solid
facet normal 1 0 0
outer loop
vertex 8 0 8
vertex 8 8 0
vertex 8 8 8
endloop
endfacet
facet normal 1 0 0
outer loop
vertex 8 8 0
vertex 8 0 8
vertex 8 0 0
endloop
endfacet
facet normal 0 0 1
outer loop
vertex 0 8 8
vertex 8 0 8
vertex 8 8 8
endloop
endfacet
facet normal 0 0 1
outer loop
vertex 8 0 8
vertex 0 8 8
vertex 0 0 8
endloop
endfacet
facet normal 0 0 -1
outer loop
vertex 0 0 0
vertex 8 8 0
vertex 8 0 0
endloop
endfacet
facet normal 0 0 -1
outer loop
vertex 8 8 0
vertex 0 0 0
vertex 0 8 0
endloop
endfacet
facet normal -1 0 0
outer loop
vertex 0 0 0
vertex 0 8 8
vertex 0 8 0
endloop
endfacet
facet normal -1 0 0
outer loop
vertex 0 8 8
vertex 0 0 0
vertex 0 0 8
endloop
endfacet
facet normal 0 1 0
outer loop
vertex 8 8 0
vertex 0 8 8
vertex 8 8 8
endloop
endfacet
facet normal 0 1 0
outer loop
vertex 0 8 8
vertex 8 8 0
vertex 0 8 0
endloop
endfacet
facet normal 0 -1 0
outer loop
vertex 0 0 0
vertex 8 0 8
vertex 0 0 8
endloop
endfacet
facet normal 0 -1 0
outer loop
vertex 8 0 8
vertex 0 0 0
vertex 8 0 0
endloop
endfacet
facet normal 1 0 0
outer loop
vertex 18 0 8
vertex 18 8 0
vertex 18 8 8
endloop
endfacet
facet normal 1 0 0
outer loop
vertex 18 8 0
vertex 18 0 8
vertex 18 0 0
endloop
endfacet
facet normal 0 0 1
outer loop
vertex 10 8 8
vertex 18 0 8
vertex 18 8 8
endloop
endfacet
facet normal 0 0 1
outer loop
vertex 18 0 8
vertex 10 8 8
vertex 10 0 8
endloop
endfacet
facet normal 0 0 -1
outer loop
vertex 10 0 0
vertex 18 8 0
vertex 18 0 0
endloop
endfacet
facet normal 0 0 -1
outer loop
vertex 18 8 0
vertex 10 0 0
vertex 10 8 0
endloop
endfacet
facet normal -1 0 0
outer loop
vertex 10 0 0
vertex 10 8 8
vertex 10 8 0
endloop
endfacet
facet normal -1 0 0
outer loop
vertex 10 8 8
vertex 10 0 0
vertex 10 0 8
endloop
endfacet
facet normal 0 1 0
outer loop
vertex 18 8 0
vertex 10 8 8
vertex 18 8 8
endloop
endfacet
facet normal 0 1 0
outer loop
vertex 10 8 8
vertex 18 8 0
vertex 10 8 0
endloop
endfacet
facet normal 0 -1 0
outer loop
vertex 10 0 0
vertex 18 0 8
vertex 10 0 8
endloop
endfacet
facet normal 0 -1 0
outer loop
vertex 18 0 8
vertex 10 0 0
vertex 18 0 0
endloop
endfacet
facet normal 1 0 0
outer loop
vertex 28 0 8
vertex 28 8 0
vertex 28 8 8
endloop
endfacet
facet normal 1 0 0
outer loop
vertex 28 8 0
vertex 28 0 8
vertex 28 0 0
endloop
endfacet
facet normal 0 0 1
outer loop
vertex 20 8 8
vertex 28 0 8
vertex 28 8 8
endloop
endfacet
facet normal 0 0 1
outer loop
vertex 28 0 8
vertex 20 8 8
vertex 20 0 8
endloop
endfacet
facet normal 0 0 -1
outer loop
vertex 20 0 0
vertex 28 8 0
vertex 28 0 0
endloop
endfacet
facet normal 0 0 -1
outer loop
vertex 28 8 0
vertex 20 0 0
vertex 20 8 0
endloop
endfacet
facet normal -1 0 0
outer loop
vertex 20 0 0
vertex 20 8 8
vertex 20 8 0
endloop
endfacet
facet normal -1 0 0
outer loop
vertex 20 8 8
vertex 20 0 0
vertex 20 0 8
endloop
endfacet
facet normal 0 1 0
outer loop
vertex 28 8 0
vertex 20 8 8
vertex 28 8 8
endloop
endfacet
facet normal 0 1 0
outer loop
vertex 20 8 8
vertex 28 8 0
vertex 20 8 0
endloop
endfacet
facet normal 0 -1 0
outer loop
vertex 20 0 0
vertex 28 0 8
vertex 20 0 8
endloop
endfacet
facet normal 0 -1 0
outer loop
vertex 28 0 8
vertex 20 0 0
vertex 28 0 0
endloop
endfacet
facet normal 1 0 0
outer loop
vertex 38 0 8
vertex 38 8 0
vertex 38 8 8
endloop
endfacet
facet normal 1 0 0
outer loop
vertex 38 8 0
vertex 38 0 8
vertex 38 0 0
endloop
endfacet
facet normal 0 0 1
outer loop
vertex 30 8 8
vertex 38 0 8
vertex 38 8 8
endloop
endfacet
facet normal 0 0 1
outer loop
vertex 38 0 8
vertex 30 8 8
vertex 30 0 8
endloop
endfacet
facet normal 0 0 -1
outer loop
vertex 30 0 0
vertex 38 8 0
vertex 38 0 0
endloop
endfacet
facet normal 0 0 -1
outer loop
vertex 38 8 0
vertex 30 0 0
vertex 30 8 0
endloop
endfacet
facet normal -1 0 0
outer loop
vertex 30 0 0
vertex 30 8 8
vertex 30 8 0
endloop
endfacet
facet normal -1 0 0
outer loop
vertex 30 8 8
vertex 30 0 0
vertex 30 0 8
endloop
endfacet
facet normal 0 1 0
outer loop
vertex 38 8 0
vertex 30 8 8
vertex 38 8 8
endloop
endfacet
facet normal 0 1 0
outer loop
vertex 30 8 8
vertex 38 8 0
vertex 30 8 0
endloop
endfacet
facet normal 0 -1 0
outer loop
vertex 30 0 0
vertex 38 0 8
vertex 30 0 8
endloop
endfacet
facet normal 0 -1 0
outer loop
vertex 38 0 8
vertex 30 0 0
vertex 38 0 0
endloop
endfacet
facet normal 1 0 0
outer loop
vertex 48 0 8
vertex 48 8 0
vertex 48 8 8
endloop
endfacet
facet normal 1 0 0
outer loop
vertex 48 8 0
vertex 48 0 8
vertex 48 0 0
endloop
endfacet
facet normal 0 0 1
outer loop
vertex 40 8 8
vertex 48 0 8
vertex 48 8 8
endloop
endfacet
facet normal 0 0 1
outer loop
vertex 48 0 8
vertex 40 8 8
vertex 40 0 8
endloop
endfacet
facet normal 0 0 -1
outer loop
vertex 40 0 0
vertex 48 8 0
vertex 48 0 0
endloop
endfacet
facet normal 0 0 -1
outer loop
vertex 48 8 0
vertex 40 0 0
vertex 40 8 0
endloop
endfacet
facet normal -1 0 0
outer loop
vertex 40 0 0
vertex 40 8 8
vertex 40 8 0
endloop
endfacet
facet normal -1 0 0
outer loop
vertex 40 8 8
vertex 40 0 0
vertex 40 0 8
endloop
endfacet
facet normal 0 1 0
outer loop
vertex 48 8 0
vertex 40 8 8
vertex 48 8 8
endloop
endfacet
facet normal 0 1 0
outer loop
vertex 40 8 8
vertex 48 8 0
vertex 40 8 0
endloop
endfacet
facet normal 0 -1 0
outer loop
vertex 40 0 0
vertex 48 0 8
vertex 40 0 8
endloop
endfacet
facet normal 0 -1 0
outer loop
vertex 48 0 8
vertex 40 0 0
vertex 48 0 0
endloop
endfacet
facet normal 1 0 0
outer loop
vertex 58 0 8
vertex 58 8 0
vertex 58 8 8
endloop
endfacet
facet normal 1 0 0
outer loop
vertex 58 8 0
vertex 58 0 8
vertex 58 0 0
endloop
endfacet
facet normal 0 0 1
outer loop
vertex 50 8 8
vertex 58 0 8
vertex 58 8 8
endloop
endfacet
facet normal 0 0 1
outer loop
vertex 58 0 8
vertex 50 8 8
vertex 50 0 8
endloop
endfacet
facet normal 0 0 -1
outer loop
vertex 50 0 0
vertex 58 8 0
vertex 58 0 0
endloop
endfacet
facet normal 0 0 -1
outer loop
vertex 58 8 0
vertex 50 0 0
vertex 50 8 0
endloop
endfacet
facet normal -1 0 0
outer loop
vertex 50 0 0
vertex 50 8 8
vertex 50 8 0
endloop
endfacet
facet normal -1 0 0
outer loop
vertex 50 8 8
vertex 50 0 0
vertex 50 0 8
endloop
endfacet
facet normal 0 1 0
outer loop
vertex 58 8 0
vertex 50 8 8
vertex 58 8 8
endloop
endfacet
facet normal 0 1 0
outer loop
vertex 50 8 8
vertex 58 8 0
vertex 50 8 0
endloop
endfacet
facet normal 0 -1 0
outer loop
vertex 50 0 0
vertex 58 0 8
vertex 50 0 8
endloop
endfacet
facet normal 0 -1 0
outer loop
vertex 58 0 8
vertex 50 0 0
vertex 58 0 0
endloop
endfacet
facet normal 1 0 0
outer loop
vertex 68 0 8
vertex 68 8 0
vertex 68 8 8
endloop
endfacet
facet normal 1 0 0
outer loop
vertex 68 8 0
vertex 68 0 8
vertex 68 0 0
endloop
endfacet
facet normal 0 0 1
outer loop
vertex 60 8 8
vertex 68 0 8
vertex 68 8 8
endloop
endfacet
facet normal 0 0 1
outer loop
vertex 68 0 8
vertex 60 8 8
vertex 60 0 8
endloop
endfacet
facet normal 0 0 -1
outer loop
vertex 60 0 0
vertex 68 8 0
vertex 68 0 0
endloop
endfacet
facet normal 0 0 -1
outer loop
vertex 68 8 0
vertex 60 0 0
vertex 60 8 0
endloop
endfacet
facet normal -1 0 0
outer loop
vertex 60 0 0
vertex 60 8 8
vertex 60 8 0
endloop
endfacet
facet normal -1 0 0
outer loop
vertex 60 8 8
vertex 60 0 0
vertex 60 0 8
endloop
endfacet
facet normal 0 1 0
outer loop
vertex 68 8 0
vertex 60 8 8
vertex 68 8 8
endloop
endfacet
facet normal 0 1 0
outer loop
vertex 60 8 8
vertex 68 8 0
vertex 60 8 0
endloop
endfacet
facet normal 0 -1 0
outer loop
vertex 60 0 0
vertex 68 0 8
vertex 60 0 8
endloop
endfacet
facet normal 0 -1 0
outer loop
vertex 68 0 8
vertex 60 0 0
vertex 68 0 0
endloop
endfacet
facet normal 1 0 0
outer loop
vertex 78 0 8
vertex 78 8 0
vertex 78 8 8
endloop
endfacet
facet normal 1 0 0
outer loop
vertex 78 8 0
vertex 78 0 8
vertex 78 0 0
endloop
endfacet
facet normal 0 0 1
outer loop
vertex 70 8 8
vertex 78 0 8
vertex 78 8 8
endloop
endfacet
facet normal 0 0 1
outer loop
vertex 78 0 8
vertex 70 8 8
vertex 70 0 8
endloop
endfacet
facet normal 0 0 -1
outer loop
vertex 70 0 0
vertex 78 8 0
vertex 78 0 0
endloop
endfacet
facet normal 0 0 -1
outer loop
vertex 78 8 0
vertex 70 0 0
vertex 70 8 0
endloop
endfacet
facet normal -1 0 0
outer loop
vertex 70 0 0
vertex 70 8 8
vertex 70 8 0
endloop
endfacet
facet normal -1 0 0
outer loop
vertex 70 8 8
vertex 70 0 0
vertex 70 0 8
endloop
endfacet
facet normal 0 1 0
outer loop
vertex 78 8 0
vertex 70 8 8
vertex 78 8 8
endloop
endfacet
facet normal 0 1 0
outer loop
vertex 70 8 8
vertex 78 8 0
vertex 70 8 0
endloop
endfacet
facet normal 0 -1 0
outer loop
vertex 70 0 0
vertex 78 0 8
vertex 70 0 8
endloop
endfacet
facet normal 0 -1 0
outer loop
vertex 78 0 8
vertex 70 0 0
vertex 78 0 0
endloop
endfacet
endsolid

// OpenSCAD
$fn = 150;

union() {
	cube(size = [8, 8, 8]);
	translate(v = [10, 0, 0]) {
		cube(size = [8, 8, 8]);
	}
	translate(v = [20, 0, 0]) {
		cube(size = [8, 8, 8]);
	}
	translate(v = [30, 0, 0]) {
		cube(size = [8, 8, 8]);
	}
	translate(v = [40, 0, 0]) {
		cube(size = [8, 8, 8]);
	}
	translate(v = [50, 0, 0]) {
		cube(size = [8, 8, 8]);
	}
	translate(v = [60, 0, 0]) {
		cube(size = [8, 8, 8]);
	}
	translate(v = [70, 0, 0]) {
		cube(size = [8, 8, 8]);
	}
}
